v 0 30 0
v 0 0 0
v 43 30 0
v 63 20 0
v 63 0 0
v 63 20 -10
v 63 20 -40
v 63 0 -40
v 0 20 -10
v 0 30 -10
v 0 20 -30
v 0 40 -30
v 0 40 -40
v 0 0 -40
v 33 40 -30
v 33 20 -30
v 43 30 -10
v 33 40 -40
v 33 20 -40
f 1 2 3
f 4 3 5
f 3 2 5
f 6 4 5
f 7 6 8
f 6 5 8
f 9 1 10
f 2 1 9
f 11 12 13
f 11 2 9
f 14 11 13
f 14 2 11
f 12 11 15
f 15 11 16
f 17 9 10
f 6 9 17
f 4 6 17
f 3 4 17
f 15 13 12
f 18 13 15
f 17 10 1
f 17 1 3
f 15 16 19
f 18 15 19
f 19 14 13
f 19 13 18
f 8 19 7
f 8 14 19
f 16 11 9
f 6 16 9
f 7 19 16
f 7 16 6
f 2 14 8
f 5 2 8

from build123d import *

# Parameters (mm, degrees)
BOSS_EXTRUDE1_DEPTH     = 20
SKETCH1_3_W             = 63
SKETCH1_3_H             = 10
BOSS_EXTRUDE2_DEPTH     = 30
SKETCH1_4_W             = 33
SKETCH1_4_H             = 10
BOSS_EXTRUDE3_DEPTH     = 40
CUT_EXTRUDE1_DEPTH      = 31
CUT_EXTRUDE1_DEPTH_BACK = 10


with BuildPart() as part:
    # Sketch1 → Boss-Extrude1 (new body)
    with BuildSketch(Plane(origin=(0, 0, 0), x_dir=(1, 0, 0), z_dir=(0, 1, 0))):
        Polygon((33, 30), (0, 30), (0, 10), (63, 10), (63, 40), (33, 40), align=None)
    extrude(amount=BOSS_EXTRUDE1_DEPTH)

    # Sketch1<3> → Boss-Extrude2 (add)
    with BuildSketch(Plane(origin=(0, 0, 0), x_dir=(1, 0, 0), z_dir=(0, 1, 0))):
        with Locations((31.5, 5)):
            Rectangle(SKETCH1_3_W, SKETCH1_3_H)
    extrude(amount=BOSS_EXTRUDE2_DEPTH)

    # Sketch1<4> → Boss-Extrude3 (add)
    with BuildSketch(Plane(origin=(0, 0, 0), x_dir=(1, 0, 0), z_dir=(0, 1, 0))):
        with Locations((16.5, 35)):
            Rectangle(SKETCH1_4_W, SKETCH1_4_H)
    extrude(amount=BOSS_EXTRUDE3_DEPTH)

    # Sketch2 → Cut-Extrude1 (cut, two sides)
    with BuildSketch(Plane(origin=(0, 0, -10), x_dir=(-1, 0, 0), z_dir=(0, 0, -1))) as cut_extrude1_sk:
        Polygon((-63, 30), (-63, 20), (-43, 30), align=None)
    extrude(amount=CUT_EXTRUDE1_DEPTH, mode=Mode.SUBTRACT)
    extrude(cut_extrude1_sk.sketch, amount=-CUT_EXTRUDE1_DEPTH_BACK, mode=Mode.SUBTRACT)


solid = part.part
